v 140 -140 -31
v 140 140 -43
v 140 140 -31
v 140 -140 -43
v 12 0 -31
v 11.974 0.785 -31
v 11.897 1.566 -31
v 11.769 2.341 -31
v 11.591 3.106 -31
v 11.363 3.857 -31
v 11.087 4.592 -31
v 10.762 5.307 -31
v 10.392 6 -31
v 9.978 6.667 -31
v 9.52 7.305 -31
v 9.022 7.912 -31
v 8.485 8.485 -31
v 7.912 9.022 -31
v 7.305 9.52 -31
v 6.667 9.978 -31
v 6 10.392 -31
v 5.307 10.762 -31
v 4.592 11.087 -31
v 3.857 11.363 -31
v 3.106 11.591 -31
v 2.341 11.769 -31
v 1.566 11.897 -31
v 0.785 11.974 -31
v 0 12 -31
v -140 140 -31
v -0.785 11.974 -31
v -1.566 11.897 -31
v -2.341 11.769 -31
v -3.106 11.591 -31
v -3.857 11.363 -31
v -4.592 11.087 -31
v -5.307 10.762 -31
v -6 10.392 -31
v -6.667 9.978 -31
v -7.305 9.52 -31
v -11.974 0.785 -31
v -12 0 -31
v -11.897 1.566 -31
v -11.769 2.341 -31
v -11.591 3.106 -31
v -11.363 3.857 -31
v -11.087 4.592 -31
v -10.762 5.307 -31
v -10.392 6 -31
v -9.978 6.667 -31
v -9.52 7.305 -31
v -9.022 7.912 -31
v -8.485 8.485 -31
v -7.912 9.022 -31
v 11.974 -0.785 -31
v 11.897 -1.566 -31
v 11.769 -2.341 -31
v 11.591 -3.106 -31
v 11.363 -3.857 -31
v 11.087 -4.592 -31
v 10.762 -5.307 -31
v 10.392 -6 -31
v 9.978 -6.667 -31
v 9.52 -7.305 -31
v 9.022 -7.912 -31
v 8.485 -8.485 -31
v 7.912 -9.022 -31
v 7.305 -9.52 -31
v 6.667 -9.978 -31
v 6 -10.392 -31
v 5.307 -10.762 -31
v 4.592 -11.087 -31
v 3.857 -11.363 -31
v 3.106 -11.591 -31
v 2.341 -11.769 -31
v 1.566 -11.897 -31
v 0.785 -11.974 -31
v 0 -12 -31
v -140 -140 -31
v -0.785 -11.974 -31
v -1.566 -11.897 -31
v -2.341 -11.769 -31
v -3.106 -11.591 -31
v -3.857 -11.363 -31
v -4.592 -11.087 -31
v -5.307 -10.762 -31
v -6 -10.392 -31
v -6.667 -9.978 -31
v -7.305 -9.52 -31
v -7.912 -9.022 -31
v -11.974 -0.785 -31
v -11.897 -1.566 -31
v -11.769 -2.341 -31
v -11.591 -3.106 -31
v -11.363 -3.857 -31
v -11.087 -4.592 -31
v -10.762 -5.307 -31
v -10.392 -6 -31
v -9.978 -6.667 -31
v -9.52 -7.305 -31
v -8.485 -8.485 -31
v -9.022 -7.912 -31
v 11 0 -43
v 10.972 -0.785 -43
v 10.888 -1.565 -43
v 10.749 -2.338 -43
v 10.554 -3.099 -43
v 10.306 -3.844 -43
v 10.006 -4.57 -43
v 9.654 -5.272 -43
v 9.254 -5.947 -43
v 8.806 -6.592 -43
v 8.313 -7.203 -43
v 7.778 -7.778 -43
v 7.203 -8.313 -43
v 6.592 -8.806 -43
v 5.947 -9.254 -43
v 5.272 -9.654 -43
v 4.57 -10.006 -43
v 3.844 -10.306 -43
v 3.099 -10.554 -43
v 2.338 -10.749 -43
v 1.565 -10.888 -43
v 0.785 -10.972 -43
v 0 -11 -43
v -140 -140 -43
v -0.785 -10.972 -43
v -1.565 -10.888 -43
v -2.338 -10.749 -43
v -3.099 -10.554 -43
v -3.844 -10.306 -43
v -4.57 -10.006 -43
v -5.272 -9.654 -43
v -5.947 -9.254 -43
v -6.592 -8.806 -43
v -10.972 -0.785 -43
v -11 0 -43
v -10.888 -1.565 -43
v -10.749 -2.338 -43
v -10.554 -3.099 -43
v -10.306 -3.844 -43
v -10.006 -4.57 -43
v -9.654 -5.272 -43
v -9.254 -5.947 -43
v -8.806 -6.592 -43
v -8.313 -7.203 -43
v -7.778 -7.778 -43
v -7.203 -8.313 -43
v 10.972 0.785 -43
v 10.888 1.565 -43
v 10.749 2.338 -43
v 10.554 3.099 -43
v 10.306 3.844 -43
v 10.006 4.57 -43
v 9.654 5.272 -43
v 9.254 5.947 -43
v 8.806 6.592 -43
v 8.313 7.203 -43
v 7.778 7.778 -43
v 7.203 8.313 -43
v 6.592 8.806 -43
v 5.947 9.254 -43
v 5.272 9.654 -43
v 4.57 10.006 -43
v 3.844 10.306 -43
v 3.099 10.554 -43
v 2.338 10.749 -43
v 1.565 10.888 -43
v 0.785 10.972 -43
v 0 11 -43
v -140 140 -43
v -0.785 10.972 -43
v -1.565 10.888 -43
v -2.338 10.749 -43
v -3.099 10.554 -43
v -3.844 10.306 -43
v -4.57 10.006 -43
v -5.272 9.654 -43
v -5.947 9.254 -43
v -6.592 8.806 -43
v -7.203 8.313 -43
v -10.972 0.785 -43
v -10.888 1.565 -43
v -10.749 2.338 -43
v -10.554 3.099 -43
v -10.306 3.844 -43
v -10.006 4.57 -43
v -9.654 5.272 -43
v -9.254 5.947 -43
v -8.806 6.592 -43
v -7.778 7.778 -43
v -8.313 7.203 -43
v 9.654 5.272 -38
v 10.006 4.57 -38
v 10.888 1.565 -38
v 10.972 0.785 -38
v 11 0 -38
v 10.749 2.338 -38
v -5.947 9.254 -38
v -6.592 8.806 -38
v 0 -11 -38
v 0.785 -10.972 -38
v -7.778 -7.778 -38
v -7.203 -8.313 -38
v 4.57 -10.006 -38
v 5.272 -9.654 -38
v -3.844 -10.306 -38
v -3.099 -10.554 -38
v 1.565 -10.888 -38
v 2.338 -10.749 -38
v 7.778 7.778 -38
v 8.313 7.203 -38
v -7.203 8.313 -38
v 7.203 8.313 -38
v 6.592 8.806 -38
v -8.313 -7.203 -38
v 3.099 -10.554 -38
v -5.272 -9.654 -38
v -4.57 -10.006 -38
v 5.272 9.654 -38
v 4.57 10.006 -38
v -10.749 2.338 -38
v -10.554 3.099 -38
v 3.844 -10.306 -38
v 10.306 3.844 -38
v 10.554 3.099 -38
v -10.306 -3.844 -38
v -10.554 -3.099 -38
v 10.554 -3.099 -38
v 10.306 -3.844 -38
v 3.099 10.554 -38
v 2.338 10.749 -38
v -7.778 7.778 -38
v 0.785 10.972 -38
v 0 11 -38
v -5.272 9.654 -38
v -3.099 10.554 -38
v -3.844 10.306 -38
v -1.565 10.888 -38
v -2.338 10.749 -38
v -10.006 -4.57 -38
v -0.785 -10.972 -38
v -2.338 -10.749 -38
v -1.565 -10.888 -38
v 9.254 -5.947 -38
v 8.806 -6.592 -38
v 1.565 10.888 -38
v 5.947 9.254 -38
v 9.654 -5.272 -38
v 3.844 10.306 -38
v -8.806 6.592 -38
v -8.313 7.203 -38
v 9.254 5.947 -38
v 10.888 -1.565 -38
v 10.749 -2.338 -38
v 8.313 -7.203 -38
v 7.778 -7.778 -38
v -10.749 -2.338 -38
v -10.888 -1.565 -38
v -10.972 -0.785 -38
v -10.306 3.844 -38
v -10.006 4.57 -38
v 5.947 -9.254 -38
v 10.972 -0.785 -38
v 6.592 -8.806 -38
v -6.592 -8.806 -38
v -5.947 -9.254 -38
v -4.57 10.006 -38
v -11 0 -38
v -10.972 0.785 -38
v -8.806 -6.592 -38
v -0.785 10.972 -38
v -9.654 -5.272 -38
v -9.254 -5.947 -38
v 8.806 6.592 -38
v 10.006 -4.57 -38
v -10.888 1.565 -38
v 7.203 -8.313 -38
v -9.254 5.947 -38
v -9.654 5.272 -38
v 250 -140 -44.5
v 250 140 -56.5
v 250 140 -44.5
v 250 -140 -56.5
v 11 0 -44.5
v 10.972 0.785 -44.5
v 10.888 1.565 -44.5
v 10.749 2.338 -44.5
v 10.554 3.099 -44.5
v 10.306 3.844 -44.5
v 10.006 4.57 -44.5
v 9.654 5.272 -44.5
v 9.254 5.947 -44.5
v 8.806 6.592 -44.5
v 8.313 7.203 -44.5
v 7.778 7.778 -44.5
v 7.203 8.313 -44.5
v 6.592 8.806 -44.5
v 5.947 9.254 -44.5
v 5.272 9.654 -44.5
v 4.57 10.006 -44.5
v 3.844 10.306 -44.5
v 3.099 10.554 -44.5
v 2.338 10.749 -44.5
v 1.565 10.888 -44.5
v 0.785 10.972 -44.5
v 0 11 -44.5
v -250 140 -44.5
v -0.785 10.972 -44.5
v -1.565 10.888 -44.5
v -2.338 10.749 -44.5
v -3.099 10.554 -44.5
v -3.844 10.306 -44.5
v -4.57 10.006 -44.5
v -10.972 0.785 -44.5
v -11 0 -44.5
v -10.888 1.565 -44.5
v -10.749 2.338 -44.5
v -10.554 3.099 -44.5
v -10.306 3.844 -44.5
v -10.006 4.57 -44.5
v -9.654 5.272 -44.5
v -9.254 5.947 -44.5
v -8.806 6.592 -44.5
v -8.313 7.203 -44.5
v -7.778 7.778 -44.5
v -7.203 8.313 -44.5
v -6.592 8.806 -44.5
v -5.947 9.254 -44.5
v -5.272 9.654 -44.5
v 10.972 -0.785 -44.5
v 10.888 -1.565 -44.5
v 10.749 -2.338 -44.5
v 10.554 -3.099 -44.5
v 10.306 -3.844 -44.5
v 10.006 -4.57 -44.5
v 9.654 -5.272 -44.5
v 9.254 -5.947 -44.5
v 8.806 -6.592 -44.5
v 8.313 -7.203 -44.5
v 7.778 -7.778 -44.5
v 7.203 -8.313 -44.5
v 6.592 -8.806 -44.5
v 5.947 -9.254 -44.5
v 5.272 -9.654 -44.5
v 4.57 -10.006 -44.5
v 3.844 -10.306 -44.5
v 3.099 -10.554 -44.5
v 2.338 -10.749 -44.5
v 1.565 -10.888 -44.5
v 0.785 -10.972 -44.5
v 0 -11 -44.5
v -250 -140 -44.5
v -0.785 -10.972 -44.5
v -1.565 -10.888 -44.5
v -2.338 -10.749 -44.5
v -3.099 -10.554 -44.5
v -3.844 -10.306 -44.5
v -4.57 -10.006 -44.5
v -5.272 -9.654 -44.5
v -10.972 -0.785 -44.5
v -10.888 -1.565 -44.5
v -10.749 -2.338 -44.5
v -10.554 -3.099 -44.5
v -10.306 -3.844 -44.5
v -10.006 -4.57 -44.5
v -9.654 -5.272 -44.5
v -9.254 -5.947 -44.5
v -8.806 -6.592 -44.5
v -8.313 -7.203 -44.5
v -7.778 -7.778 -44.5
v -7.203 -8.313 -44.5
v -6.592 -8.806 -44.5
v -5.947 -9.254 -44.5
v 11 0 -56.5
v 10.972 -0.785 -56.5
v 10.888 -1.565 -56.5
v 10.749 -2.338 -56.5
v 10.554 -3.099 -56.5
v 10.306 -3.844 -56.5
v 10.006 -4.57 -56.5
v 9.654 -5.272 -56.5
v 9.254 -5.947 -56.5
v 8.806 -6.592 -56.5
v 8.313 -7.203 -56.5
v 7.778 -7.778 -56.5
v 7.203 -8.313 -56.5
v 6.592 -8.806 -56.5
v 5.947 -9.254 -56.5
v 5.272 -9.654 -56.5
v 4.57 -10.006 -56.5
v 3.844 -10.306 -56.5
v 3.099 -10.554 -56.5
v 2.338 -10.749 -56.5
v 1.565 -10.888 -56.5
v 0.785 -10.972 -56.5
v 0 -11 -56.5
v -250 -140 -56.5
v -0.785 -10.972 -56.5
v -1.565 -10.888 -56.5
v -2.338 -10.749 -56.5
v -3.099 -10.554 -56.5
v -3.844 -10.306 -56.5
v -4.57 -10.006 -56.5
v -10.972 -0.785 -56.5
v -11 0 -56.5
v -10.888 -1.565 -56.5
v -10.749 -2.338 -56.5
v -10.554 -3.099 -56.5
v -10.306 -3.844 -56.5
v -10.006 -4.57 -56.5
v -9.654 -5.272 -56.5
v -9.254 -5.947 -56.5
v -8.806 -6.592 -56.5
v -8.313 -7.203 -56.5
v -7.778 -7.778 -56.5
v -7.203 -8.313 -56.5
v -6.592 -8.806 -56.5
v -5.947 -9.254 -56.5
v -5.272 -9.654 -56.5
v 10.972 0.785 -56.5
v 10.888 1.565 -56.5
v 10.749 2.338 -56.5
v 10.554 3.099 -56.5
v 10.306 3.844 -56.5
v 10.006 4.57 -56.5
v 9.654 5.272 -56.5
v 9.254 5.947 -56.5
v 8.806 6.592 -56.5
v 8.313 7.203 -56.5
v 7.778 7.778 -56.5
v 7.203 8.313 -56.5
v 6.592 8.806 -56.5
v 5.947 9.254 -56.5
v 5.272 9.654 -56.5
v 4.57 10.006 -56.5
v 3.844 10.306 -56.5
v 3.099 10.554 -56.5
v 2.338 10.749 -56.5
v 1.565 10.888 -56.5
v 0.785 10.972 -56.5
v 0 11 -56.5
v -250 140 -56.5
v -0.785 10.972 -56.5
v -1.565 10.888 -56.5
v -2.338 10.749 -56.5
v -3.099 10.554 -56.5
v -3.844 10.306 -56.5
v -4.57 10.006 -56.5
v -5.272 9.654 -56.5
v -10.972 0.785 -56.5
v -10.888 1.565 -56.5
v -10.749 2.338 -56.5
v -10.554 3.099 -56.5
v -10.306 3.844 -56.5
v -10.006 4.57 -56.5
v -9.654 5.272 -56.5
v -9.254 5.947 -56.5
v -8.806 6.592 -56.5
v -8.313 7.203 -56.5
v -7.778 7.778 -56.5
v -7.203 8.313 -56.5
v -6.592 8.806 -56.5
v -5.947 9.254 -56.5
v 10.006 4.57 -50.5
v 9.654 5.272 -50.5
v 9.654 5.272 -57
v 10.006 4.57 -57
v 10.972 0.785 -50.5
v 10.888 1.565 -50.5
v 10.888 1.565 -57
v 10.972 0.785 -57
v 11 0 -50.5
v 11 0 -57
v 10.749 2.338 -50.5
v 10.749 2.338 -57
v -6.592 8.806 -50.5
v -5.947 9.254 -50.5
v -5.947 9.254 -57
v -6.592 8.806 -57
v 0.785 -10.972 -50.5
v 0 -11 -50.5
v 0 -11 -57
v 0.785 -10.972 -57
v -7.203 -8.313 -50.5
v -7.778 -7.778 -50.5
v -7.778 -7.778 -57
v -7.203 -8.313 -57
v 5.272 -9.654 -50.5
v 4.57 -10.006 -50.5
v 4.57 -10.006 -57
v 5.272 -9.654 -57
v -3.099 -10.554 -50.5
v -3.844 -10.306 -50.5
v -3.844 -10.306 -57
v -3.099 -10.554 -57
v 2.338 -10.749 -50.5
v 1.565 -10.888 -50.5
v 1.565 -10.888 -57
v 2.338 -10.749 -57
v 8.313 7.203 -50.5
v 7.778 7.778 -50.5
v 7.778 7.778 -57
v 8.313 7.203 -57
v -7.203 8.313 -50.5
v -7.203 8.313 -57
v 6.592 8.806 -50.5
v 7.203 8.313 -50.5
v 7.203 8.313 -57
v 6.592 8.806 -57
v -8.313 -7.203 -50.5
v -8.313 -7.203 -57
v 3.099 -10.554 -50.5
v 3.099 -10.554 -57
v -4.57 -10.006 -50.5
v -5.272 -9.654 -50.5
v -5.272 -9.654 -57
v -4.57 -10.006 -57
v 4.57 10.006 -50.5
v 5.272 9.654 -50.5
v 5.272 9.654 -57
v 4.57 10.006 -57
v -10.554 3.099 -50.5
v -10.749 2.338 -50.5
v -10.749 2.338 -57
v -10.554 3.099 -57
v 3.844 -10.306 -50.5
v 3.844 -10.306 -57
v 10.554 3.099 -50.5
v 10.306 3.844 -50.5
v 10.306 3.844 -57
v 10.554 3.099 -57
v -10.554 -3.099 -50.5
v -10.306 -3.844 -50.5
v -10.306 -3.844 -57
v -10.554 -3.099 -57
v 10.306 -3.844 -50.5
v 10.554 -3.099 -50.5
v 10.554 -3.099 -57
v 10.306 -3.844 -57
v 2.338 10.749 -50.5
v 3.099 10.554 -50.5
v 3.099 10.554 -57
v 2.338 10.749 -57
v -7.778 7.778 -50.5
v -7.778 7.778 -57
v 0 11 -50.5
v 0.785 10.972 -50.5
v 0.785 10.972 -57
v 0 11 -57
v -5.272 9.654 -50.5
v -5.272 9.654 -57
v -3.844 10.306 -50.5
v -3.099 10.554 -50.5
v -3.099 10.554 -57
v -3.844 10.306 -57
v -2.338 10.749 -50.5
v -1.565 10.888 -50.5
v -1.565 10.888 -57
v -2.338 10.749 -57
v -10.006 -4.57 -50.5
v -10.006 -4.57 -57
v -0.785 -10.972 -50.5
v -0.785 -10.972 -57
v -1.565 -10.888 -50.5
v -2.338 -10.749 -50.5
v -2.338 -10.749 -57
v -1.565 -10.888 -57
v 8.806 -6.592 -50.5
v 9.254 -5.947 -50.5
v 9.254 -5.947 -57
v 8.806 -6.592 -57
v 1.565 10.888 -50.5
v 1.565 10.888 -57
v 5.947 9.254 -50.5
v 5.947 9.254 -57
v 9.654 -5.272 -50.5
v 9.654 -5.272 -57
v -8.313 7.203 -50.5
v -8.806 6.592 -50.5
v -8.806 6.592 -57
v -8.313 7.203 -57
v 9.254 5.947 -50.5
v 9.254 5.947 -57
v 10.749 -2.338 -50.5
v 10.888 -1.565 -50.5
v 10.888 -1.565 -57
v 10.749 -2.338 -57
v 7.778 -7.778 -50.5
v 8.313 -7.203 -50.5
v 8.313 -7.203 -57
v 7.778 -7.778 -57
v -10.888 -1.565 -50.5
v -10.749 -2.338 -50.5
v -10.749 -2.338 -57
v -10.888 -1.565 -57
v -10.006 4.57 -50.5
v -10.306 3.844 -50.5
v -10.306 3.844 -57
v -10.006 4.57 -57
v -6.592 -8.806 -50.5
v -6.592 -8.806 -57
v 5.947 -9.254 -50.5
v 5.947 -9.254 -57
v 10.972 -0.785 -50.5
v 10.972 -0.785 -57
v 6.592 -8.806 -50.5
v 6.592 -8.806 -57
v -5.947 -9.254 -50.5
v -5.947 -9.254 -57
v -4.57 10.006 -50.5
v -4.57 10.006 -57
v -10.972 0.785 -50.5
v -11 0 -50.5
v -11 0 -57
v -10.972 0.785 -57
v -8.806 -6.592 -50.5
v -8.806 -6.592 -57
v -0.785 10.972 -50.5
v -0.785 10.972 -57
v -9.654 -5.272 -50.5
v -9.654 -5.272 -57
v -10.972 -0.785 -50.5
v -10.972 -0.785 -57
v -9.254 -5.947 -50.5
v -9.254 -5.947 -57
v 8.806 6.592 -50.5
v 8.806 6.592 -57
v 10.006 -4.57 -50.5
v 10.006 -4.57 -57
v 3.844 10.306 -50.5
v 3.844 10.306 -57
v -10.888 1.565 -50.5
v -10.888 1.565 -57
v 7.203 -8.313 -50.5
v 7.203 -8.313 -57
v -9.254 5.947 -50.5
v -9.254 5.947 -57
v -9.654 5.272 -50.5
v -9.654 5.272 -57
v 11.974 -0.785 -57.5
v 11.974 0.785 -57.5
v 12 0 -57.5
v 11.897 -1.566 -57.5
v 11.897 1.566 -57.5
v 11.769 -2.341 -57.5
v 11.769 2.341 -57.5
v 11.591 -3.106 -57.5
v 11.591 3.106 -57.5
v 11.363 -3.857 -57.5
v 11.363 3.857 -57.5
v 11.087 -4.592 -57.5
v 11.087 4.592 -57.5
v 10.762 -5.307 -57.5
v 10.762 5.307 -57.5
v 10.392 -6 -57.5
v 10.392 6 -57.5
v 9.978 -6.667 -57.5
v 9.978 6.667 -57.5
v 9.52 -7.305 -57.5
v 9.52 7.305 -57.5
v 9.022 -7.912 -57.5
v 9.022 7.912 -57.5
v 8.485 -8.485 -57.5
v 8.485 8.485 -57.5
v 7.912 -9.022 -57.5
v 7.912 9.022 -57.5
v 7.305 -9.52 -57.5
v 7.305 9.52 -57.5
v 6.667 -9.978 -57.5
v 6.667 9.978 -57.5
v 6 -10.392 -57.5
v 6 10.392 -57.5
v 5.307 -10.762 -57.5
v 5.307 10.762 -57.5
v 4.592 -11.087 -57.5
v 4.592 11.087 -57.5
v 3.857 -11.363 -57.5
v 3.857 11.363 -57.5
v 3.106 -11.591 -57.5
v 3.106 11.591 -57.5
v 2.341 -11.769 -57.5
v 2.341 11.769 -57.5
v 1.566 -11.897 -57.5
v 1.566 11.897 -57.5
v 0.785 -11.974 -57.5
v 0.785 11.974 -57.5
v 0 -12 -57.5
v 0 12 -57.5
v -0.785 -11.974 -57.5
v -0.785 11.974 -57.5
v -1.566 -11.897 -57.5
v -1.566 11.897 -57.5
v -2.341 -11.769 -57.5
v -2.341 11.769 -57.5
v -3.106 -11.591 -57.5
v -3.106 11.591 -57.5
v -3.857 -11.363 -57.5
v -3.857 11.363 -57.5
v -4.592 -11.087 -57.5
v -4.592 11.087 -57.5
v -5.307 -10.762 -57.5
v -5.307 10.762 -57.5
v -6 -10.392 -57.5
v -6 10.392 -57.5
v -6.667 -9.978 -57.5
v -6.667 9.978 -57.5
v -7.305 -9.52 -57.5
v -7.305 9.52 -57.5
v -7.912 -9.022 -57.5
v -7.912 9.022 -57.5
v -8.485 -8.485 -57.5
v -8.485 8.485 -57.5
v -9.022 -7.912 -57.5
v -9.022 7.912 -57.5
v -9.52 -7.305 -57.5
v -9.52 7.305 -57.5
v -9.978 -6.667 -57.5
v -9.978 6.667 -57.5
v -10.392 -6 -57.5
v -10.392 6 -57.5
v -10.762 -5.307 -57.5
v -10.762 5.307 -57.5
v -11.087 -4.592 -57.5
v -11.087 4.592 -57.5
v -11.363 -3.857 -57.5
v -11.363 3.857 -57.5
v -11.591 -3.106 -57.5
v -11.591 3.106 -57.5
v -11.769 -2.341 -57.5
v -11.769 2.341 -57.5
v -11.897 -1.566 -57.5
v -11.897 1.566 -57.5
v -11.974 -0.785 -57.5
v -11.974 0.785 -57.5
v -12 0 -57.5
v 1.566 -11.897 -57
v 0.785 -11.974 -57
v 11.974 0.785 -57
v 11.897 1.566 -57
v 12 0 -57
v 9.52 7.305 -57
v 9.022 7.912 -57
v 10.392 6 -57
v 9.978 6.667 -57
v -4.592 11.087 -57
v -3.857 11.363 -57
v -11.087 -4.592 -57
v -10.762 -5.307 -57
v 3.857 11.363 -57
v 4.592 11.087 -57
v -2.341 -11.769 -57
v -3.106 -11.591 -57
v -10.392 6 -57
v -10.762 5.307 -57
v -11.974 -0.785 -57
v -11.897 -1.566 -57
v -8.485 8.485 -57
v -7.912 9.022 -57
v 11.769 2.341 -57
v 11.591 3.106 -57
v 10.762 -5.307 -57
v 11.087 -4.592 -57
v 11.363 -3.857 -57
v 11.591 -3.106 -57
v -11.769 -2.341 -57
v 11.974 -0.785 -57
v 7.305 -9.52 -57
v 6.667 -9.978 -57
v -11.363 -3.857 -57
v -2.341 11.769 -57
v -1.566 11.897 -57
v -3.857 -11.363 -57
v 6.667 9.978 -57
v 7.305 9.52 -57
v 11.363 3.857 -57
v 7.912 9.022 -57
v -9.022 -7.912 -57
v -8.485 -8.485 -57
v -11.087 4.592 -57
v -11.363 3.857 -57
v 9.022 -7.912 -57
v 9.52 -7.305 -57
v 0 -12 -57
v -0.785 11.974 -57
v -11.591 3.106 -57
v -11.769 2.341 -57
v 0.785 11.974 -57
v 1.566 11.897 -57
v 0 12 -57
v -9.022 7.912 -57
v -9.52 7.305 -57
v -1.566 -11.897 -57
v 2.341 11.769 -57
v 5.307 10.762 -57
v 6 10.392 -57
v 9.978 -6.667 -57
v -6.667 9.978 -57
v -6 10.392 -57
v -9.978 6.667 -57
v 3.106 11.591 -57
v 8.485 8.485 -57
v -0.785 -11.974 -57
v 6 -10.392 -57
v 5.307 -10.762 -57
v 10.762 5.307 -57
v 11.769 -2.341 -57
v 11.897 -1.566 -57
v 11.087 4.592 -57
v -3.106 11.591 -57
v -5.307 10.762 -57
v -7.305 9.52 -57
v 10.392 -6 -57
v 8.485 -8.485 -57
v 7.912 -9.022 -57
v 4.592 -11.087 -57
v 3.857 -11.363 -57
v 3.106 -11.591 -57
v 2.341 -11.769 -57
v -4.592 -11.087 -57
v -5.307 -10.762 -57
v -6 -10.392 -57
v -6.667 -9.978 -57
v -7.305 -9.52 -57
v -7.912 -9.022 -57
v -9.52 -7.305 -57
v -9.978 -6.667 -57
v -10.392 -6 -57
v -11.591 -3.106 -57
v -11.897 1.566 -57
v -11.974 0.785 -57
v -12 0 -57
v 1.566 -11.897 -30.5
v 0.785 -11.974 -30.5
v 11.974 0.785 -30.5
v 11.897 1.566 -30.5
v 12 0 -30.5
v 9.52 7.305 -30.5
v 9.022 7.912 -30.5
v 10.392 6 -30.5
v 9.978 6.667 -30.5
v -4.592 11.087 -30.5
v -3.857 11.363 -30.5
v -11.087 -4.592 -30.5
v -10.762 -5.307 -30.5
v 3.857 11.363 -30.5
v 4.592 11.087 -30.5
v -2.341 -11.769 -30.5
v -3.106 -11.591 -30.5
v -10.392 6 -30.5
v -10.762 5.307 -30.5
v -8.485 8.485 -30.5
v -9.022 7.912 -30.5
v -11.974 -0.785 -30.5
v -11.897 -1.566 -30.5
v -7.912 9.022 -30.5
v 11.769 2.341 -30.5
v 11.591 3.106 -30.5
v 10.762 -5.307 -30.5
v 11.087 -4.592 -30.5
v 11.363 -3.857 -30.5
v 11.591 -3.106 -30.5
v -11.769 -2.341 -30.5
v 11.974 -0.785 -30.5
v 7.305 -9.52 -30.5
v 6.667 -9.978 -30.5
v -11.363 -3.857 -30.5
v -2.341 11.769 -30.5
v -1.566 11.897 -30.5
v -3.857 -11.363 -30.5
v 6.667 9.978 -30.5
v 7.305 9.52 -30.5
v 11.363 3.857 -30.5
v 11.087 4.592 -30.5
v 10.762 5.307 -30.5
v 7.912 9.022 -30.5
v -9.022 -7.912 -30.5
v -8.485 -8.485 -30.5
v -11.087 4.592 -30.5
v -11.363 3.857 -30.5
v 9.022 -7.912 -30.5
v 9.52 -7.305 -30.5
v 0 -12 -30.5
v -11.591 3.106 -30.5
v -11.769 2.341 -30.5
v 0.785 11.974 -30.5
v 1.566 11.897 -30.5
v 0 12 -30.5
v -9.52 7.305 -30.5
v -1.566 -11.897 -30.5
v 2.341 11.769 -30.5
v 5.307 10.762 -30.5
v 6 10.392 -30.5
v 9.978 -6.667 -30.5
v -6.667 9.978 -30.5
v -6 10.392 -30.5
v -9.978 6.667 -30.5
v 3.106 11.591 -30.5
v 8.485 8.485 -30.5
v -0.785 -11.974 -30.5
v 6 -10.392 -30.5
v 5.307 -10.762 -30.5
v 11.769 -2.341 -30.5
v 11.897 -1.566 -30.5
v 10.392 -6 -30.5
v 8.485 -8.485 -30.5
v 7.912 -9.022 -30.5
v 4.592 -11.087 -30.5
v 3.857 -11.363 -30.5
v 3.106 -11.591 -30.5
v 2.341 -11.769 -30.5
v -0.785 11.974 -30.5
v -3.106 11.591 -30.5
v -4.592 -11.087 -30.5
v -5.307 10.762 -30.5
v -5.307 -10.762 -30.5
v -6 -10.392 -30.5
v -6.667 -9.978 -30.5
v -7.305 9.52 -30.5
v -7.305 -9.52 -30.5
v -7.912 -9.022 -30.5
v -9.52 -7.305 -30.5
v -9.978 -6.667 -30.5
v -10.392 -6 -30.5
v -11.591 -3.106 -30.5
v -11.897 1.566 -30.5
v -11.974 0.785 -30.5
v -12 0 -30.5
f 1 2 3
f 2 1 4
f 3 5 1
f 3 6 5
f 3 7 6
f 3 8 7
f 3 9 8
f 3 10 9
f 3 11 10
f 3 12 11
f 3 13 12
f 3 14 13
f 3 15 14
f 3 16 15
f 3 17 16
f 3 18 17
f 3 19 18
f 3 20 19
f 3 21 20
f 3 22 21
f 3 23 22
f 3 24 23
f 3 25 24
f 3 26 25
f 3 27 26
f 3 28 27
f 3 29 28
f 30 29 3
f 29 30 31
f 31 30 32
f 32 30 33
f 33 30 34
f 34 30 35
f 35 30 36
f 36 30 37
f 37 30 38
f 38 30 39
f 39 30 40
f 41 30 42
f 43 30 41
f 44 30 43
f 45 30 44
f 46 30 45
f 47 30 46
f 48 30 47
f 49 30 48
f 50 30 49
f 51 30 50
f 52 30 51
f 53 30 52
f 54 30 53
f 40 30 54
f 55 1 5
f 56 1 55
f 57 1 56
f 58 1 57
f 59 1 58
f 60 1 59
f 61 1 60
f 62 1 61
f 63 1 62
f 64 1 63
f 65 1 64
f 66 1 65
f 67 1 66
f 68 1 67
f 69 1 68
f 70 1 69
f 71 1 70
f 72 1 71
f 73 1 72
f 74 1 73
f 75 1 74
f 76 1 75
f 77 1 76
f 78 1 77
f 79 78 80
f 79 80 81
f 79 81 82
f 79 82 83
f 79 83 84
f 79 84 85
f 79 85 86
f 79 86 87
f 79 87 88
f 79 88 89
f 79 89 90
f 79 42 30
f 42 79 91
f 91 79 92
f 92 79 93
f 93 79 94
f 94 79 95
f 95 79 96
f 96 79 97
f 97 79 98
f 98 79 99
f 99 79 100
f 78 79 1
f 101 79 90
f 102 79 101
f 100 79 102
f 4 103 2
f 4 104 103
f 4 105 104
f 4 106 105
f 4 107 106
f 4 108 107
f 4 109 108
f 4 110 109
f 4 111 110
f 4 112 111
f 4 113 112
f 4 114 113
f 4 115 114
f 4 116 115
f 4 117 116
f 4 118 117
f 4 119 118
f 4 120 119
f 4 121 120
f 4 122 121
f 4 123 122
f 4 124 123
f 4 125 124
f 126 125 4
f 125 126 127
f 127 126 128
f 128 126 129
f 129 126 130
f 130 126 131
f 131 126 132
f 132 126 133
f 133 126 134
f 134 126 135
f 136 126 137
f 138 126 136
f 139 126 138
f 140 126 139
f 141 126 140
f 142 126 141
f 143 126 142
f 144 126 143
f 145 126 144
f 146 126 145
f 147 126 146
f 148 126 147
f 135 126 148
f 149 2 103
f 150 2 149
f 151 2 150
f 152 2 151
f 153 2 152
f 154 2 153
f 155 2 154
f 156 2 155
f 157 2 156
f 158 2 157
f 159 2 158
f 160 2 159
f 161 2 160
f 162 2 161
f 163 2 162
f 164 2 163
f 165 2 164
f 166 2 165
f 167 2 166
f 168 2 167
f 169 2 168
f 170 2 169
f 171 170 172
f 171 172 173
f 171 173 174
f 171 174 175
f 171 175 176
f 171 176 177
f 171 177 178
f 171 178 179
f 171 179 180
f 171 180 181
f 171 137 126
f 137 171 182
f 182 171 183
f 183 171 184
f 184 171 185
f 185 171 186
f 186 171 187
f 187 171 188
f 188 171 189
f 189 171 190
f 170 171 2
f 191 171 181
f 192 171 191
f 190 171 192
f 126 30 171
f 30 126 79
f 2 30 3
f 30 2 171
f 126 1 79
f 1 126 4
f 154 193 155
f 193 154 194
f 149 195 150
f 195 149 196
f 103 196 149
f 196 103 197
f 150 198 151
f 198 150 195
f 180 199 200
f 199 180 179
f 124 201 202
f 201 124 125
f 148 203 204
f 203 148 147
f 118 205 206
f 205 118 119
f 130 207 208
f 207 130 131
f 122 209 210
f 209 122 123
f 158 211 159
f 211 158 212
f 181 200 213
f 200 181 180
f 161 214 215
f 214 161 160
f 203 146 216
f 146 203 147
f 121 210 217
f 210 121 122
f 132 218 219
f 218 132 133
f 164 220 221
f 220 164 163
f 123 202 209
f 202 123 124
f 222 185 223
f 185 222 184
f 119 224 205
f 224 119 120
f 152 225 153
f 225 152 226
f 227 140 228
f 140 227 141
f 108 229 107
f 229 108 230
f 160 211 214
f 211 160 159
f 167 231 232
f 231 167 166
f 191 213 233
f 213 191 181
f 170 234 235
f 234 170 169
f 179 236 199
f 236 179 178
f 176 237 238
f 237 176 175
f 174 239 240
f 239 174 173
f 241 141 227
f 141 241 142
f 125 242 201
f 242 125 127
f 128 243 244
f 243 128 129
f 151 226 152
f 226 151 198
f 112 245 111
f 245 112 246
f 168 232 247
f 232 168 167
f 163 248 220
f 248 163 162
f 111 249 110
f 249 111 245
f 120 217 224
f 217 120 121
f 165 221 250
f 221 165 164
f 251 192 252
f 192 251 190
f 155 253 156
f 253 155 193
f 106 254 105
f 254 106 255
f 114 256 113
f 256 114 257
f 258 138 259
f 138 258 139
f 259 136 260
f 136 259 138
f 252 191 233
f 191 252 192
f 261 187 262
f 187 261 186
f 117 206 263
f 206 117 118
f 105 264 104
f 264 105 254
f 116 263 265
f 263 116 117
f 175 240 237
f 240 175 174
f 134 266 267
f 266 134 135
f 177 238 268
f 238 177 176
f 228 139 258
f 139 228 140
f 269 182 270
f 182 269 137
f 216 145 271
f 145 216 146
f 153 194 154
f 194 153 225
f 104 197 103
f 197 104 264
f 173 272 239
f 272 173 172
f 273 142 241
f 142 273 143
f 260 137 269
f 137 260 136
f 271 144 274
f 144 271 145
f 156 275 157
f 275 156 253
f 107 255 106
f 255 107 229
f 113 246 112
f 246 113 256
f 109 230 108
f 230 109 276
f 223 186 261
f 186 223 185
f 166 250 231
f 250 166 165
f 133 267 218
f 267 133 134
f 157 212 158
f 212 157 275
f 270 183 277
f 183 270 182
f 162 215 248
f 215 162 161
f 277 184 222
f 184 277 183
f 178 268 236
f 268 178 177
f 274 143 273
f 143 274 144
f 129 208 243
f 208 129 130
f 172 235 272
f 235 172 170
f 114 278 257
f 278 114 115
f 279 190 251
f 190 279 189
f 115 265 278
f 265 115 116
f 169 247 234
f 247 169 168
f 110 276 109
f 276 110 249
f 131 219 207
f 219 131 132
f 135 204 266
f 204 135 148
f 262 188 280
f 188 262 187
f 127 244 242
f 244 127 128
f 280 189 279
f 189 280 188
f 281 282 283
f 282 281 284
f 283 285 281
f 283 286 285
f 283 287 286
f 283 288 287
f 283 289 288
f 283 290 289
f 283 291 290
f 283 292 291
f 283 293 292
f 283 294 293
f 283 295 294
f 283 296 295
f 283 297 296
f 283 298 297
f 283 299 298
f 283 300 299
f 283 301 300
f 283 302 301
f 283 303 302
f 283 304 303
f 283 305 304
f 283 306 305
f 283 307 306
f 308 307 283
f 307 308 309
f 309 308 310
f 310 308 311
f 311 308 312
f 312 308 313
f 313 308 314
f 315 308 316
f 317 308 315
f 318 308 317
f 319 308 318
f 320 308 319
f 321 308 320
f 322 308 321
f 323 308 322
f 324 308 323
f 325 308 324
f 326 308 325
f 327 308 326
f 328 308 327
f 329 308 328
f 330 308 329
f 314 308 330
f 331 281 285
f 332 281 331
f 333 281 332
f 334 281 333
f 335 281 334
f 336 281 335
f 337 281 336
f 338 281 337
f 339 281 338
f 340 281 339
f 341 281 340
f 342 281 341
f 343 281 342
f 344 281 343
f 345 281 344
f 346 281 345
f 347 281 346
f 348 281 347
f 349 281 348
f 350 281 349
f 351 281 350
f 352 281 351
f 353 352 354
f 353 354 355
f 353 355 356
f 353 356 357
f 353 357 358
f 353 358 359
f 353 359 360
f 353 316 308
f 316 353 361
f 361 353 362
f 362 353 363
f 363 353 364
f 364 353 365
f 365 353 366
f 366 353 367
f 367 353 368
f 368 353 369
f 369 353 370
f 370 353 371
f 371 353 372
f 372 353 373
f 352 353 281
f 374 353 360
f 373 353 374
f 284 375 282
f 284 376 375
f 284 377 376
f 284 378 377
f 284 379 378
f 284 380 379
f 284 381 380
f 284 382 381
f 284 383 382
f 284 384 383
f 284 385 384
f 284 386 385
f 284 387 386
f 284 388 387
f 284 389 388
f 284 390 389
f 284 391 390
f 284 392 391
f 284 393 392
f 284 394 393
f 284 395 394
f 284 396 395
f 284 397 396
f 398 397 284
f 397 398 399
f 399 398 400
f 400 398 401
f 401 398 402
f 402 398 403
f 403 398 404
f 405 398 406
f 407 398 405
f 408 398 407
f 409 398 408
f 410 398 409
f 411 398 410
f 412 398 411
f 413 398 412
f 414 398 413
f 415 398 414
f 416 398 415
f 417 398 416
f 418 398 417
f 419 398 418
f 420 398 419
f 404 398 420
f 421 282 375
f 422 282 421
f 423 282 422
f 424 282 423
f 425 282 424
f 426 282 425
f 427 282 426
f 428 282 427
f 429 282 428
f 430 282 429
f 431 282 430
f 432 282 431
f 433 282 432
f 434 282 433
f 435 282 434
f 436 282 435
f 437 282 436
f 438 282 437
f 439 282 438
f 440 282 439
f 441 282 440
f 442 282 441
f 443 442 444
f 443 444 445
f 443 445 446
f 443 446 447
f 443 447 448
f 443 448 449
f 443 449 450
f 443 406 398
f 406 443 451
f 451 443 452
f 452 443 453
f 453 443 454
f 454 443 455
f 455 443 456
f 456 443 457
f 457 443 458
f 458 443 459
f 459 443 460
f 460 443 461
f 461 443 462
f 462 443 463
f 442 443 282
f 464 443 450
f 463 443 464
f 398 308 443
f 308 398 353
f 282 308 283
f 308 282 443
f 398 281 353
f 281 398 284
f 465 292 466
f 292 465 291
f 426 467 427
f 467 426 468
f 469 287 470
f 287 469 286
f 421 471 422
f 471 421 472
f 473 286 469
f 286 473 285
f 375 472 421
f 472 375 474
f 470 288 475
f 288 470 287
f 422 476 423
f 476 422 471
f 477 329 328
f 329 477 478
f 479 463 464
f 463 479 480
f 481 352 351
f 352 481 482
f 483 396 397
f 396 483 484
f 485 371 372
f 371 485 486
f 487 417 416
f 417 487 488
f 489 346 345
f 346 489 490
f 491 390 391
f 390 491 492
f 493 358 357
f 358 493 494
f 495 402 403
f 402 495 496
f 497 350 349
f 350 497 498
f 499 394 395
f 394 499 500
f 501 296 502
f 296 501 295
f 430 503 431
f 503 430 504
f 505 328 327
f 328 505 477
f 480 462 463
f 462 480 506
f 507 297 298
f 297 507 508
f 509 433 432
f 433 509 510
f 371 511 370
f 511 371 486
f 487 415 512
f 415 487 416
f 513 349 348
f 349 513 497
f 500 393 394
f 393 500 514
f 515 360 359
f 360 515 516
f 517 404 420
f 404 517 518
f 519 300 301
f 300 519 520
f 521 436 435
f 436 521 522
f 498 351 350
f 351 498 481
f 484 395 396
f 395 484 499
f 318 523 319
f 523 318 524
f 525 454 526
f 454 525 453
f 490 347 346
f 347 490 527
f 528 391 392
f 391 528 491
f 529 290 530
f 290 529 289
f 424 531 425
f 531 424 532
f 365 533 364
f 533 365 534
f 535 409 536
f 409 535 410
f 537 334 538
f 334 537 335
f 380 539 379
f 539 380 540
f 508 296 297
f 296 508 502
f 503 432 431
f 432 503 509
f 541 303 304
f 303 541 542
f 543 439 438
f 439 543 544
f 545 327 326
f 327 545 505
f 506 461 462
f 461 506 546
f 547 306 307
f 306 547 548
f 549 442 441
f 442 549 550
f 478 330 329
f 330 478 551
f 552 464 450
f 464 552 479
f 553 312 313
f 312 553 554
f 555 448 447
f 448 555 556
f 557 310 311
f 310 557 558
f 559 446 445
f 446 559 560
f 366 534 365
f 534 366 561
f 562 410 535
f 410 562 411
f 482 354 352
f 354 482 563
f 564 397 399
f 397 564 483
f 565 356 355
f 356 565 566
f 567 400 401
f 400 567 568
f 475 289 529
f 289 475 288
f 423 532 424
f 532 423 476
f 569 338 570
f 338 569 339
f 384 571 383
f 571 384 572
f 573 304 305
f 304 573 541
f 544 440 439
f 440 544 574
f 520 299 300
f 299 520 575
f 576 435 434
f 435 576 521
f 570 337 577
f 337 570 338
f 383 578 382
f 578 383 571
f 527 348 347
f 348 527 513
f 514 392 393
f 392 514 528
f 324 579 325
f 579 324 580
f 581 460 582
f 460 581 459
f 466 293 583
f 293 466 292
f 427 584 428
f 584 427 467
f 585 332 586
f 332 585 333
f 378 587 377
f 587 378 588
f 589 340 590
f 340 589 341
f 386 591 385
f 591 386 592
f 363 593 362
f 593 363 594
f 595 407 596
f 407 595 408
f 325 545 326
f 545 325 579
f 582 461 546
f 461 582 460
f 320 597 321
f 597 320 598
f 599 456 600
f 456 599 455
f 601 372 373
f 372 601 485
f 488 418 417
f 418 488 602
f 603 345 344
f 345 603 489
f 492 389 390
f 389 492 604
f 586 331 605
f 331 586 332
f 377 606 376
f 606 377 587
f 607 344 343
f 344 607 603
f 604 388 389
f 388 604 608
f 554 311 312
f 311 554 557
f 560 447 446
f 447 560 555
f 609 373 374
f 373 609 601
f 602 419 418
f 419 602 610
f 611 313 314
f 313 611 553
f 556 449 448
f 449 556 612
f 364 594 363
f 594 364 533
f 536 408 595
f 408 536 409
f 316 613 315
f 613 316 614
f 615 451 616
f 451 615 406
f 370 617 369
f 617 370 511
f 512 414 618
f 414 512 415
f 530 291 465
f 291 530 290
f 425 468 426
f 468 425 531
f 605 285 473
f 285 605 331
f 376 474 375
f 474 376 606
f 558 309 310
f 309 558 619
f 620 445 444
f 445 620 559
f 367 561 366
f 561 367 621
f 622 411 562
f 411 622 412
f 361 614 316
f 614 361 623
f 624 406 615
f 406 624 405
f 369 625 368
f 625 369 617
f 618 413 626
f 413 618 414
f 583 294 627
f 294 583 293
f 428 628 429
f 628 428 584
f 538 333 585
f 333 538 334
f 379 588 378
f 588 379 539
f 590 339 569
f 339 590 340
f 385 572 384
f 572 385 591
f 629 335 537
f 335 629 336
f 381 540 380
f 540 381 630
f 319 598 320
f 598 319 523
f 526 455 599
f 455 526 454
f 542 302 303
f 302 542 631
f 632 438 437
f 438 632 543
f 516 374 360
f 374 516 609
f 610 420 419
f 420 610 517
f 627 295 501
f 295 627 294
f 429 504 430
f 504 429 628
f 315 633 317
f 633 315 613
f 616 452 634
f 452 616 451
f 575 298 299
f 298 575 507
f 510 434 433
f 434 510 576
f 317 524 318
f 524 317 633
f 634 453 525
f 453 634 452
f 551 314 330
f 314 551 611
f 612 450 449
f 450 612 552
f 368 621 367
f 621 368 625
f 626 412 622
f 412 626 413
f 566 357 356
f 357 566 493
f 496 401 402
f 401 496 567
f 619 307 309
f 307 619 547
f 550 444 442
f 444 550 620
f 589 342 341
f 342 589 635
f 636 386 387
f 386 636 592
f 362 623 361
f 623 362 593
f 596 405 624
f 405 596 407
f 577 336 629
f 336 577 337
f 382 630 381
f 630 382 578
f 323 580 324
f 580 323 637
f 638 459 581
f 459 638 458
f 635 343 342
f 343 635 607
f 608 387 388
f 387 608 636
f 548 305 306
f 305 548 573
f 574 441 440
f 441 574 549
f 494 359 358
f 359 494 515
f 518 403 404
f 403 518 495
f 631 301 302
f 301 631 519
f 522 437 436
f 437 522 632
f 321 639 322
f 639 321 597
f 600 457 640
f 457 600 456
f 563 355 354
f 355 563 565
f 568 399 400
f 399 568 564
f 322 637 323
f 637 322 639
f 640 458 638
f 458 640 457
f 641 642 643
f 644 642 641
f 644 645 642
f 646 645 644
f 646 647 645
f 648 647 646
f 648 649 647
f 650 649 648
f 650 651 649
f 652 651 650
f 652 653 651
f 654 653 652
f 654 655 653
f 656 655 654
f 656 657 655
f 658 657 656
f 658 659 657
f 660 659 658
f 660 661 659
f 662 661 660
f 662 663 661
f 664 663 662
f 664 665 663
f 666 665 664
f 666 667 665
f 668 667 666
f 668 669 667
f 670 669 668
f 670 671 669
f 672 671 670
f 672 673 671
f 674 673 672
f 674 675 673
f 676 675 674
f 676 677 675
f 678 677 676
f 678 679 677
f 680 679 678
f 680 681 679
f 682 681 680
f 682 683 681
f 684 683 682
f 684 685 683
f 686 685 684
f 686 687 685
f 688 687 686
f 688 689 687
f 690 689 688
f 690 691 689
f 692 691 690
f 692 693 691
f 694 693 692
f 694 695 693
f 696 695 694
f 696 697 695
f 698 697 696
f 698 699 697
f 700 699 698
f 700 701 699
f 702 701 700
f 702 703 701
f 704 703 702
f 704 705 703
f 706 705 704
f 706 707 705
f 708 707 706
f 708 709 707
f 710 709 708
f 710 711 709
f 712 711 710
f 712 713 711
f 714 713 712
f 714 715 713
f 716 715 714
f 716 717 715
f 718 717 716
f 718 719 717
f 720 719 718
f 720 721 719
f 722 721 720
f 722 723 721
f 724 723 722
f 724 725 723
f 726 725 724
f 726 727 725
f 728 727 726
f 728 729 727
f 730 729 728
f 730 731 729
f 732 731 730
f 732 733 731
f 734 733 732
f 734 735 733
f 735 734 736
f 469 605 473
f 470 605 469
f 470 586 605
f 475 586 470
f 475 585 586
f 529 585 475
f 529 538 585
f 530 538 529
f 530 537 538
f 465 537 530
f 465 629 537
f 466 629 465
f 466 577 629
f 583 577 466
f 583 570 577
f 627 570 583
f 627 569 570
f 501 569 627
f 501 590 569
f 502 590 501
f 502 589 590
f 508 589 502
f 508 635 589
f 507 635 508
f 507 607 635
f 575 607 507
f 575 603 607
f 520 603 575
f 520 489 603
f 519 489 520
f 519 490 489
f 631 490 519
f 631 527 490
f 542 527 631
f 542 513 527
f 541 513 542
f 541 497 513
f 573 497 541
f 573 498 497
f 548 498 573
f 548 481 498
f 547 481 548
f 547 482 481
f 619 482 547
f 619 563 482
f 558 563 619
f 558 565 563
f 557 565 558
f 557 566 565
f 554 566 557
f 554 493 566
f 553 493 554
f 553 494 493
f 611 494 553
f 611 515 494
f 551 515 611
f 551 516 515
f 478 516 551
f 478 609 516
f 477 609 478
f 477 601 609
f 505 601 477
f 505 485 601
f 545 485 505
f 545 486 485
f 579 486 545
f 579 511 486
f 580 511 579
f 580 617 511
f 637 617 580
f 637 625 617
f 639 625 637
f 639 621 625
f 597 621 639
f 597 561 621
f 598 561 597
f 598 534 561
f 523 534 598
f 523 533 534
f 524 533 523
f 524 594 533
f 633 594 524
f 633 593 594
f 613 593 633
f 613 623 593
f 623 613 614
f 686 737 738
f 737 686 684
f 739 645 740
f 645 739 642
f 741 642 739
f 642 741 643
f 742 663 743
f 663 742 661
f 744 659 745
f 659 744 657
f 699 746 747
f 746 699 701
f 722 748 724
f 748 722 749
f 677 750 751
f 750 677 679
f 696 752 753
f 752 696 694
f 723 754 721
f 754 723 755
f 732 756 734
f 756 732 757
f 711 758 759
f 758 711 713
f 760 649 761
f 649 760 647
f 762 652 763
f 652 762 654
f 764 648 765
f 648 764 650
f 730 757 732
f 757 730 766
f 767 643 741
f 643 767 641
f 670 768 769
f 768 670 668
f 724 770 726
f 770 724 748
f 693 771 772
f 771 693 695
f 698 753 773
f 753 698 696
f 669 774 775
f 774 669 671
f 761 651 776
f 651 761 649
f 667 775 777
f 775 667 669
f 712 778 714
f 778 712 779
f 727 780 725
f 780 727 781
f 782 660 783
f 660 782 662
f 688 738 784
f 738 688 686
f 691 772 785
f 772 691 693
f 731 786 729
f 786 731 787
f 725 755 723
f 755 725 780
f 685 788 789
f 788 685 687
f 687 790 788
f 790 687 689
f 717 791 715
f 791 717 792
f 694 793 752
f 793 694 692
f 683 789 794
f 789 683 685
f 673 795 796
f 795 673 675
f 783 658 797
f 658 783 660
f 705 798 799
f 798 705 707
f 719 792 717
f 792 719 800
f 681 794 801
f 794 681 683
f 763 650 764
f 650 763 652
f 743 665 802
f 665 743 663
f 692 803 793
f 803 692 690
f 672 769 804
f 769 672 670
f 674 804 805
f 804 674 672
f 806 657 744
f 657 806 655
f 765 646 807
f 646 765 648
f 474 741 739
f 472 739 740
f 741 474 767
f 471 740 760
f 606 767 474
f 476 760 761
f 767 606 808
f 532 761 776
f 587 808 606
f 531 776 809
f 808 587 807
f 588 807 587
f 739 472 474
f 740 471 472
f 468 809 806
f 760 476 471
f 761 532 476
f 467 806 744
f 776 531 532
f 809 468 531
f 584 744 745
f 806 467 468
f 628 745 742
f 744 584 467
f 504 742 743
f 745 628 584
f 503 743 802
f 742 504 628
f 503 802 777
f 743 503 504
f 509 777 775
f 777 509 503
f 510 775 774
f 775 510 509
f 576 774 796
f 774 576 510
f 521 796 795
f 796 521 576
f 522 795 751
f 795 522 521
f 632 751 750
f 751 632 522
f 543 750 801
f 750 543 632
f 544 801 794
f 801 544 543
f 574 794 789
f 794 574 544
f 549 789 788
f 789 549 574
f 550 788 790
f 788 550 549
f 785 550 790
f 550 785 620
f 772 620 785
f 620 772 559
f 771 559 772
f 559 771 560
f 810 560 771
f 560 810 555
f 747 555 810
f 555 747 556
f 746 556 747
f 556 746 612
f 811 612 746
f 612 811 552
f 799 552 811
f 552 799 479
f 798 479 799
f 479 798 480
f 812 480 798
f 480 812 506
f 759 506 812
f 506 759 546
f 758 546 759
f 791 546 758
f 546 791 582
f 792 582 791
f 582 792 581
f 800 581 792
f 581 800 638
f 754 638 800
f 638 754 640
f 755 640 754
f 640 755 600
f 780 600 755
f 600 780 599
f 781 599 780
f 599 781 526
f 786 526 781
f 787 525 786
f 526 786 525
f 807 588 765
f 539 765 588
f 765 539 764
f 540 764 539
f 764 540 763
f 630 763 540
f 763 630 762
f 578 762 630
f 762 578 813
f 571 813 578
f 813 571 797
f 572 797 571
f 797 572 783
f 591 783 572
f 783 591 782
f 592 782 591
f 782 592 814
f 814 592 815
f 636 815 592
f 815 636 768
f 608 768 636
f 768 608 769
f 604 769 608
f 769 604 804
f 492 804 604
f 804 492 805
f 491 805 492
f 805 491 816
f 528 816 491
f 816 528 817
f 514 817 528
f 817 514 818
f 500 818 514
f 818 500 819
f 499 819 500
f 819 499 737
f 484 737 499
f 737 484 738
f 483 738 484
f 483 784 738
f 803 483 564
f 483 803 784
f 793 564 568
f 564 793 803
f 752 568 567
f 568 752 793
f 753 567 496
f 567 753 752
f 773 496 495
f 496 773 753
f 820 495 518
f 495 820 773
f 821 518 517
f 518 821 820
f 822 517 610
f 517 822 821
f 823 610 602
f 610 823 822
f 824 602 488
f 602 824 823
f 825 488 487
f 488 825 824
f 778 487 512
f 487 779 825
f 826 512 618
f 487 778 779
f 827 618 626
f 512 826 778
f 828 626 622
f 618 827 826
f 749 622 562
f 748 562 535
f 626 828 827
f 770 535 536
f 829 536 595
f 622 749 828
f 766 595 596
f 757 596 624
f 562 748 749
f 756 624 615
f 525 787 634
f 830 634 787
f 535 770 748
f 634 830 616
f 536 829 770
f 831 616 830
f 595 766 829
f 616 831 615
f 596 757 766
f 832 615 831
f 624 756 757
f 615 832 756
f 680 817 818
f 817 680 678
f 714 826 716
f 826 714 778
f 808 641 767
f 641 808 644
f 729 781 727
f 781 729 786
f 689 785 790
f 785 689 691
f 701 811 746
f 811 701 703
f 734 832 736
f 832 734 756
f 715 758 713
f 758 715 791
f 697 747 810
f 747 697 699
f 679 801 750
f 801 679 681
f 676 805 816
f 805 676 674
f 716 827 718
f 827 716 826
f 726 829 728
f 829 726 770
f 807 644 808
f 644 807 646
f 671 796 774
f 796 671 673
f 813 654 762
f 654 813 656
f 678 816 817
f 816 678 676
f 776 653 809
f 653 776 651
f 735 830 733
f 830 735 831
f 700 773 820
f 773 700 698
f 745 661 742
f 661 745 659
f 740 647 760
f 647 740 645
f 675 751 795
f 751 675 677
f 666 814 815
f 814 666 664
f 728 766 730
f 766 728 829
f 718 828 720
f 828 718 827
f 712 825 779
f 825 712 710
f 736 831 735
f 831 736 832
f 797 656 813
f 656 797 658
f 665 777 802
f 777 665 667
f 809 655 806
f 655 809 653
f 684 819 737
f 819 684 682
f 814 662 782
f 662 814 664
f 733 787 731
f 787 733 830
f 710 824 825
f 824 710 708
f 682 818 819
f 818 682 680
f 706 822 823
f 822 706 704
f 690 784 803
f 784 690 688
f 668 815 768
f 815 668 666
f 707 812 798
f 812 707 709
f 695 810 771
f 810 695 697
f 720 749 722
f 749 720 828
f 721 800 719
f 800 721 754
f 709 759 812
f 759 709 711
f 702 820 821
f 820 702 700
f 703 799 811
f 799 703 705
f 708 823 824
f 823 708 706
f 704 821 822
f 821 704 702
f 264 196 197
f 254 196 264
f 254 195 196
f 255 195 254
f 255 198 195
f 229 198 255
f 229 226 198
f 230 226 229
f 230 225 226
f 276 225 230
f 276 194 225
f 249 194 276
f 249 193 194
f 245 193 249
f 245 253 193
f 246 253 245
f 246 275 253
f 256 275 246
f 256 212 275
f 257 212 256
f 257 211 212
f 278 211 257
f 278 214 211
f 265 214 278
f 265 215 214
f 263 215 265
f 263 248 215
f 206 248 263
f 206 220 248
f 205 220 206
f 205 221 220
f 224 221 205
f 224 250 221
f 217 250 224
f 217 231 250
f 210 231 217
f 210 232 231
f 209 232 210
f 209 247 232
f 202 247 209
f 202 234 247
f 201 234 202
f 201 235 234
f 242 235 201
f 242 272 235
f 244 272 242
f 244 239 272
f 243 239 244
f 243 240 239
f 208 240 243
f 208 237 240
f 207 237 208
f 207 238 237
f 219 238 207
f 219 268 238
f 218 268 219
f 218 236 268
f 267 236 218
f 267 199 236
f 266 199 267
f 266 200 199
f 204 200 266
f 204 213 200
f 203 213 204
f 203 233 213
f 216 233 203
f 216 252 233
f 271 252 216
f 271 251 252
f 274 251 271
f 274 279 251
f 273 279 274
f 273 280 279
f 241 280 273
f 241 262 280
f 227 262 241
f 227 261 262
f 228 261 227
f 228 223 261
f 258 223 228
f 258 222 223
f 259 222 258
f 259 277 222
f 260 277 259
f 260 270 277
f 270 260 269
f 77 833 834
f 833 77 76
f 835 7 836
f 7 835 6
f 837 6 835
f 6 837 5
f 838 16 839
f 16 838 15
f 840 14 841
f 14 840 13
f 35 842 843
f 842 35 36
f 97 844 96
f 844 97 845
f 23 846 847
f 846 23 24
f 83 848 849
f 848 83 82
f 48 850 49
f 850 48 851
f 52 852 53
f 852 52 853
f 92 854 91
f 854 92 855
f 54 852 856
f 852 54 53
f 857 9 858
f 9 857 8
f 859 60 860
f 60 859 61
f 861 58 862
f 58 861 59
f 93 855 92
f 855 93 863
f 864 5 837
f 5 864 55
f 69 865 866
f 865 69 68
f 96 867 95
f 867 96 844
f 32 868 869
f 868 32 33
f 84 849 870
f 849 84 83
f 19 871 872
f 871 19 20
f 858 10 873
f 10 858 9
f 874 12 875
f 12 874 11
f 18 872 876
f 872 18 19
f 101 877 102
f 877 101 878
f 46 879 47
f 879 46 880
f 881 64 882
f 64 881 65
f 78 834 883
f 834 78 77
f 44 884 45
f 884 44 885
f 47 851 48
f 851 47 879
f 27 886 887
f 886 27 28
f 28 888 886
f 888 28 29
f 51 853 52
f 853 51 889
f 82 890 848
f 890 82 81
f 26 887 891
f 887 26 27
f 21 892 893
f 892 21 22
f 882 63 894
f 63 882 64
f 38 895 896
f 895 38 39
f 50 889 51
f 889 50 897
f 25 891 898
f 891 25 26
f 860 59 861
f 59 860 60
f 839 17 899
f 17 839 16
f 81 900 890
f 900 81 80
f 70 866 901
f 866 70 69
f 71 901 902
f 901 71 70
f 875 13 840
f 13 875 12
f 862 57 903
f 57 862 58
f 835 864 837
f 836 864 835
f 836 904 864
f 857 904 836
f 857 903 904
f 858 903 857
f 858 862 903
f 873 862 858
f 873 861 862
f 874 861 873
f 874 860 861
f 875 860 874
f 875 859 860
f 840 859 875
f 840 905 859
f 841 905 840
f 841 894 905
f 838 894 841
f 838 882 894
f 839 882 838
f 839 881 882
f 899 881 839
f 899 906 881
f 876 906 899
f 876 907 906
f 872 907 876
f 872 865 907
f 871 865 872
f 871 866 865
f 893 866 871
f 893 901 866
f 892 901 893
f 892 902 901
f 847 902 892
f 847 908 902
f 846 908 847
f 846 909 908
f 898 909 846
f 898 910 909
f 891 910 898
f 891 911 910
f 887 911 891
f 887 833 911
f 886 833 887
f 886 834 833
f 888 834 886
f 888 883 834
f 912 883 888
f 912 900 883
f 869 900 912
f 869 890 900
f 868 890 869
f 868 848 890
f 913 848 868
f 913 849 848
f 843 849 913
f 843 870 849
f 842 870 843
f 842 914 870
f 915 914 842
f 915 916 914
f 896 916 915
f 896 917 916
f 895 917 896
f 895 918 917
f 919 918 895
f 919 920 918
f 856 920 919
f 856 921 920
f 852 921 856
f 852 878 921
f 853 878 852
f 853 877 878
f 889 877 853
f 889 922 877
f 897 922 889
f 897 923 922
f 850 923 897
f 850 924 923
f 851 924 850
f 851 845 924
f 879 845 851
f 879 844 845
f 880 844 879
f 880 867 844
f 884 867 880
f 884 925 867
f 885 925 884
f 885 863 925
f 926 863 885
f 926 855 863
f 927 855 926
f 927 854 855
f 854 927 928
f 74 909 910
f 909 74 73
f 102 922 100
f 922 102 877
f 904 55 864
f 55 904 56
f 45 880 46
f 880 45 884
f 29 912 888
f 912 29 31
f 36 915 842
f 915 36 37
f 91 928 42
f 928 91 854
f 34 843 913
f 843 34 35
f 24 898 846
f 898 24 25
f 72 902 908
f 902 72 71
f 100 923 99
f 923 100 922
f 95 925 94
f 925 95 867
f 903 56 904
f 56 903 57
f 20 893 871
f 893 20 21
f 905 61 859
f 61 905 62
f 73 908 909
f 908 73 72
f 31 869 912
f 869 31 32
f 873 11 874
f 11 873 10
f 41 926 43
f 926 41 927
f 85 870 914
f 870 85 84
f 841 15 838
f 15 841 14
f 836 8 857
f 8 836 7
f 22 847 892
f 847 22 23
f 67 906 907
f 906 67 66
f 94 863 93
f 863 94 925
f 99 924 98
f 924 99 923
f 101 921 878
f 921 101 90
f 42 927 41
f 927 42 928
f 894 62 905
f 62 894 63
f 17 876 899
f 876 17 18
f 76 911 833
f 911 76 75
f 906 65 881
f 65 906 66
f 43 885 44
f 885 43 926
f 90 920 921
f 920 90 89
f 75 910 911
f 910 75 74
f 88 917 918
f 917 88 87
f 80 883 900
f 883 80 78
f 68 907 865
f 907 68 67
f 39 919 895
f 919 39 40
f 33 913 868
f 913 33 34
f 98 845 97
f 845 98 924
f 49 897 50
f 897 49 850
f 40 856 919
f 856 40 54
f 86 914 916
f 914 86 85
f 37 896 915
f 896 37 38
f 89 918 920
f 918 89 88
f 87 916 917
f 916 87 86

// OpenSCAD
module MountingPlateBottom(){
  difference(){
    translate([-140, -140, 0])cube([280, 280, 12.0]);
    translate([0, 0, -0.1])cylinder(d=22,h=12.2,$fn=88);
  }
}
module MountingPlateTop(){
  difference(){
    translate([-250, -140, 0])cube([500, 280, 12.0]);
    translate([0, 0, -0.1])cylinder(d=22,h=12.2,$fn=88);
  }
}
$fn=64;
translate([0, 0, -43])union(){
    color("SteelBlue")MountingPlateBottom();
    translate([0, 0, -13.5])color("Aquamarine")MountingPlateTop();
    translate([0, 0, -14.5])color("#efefef")union(){
          cylinder(d=22,h=7,$fn=88);
          cylinder(d=24,h=0.5,$fn=96);
        }

    translate([0, 0, 5])color("#efefef")union(){
          cylinder(d=22,h=7,$fn=88);
          translate([0, 0, 7])cylinder(d=24,h=0.5,$fn=96);
        }

  }
